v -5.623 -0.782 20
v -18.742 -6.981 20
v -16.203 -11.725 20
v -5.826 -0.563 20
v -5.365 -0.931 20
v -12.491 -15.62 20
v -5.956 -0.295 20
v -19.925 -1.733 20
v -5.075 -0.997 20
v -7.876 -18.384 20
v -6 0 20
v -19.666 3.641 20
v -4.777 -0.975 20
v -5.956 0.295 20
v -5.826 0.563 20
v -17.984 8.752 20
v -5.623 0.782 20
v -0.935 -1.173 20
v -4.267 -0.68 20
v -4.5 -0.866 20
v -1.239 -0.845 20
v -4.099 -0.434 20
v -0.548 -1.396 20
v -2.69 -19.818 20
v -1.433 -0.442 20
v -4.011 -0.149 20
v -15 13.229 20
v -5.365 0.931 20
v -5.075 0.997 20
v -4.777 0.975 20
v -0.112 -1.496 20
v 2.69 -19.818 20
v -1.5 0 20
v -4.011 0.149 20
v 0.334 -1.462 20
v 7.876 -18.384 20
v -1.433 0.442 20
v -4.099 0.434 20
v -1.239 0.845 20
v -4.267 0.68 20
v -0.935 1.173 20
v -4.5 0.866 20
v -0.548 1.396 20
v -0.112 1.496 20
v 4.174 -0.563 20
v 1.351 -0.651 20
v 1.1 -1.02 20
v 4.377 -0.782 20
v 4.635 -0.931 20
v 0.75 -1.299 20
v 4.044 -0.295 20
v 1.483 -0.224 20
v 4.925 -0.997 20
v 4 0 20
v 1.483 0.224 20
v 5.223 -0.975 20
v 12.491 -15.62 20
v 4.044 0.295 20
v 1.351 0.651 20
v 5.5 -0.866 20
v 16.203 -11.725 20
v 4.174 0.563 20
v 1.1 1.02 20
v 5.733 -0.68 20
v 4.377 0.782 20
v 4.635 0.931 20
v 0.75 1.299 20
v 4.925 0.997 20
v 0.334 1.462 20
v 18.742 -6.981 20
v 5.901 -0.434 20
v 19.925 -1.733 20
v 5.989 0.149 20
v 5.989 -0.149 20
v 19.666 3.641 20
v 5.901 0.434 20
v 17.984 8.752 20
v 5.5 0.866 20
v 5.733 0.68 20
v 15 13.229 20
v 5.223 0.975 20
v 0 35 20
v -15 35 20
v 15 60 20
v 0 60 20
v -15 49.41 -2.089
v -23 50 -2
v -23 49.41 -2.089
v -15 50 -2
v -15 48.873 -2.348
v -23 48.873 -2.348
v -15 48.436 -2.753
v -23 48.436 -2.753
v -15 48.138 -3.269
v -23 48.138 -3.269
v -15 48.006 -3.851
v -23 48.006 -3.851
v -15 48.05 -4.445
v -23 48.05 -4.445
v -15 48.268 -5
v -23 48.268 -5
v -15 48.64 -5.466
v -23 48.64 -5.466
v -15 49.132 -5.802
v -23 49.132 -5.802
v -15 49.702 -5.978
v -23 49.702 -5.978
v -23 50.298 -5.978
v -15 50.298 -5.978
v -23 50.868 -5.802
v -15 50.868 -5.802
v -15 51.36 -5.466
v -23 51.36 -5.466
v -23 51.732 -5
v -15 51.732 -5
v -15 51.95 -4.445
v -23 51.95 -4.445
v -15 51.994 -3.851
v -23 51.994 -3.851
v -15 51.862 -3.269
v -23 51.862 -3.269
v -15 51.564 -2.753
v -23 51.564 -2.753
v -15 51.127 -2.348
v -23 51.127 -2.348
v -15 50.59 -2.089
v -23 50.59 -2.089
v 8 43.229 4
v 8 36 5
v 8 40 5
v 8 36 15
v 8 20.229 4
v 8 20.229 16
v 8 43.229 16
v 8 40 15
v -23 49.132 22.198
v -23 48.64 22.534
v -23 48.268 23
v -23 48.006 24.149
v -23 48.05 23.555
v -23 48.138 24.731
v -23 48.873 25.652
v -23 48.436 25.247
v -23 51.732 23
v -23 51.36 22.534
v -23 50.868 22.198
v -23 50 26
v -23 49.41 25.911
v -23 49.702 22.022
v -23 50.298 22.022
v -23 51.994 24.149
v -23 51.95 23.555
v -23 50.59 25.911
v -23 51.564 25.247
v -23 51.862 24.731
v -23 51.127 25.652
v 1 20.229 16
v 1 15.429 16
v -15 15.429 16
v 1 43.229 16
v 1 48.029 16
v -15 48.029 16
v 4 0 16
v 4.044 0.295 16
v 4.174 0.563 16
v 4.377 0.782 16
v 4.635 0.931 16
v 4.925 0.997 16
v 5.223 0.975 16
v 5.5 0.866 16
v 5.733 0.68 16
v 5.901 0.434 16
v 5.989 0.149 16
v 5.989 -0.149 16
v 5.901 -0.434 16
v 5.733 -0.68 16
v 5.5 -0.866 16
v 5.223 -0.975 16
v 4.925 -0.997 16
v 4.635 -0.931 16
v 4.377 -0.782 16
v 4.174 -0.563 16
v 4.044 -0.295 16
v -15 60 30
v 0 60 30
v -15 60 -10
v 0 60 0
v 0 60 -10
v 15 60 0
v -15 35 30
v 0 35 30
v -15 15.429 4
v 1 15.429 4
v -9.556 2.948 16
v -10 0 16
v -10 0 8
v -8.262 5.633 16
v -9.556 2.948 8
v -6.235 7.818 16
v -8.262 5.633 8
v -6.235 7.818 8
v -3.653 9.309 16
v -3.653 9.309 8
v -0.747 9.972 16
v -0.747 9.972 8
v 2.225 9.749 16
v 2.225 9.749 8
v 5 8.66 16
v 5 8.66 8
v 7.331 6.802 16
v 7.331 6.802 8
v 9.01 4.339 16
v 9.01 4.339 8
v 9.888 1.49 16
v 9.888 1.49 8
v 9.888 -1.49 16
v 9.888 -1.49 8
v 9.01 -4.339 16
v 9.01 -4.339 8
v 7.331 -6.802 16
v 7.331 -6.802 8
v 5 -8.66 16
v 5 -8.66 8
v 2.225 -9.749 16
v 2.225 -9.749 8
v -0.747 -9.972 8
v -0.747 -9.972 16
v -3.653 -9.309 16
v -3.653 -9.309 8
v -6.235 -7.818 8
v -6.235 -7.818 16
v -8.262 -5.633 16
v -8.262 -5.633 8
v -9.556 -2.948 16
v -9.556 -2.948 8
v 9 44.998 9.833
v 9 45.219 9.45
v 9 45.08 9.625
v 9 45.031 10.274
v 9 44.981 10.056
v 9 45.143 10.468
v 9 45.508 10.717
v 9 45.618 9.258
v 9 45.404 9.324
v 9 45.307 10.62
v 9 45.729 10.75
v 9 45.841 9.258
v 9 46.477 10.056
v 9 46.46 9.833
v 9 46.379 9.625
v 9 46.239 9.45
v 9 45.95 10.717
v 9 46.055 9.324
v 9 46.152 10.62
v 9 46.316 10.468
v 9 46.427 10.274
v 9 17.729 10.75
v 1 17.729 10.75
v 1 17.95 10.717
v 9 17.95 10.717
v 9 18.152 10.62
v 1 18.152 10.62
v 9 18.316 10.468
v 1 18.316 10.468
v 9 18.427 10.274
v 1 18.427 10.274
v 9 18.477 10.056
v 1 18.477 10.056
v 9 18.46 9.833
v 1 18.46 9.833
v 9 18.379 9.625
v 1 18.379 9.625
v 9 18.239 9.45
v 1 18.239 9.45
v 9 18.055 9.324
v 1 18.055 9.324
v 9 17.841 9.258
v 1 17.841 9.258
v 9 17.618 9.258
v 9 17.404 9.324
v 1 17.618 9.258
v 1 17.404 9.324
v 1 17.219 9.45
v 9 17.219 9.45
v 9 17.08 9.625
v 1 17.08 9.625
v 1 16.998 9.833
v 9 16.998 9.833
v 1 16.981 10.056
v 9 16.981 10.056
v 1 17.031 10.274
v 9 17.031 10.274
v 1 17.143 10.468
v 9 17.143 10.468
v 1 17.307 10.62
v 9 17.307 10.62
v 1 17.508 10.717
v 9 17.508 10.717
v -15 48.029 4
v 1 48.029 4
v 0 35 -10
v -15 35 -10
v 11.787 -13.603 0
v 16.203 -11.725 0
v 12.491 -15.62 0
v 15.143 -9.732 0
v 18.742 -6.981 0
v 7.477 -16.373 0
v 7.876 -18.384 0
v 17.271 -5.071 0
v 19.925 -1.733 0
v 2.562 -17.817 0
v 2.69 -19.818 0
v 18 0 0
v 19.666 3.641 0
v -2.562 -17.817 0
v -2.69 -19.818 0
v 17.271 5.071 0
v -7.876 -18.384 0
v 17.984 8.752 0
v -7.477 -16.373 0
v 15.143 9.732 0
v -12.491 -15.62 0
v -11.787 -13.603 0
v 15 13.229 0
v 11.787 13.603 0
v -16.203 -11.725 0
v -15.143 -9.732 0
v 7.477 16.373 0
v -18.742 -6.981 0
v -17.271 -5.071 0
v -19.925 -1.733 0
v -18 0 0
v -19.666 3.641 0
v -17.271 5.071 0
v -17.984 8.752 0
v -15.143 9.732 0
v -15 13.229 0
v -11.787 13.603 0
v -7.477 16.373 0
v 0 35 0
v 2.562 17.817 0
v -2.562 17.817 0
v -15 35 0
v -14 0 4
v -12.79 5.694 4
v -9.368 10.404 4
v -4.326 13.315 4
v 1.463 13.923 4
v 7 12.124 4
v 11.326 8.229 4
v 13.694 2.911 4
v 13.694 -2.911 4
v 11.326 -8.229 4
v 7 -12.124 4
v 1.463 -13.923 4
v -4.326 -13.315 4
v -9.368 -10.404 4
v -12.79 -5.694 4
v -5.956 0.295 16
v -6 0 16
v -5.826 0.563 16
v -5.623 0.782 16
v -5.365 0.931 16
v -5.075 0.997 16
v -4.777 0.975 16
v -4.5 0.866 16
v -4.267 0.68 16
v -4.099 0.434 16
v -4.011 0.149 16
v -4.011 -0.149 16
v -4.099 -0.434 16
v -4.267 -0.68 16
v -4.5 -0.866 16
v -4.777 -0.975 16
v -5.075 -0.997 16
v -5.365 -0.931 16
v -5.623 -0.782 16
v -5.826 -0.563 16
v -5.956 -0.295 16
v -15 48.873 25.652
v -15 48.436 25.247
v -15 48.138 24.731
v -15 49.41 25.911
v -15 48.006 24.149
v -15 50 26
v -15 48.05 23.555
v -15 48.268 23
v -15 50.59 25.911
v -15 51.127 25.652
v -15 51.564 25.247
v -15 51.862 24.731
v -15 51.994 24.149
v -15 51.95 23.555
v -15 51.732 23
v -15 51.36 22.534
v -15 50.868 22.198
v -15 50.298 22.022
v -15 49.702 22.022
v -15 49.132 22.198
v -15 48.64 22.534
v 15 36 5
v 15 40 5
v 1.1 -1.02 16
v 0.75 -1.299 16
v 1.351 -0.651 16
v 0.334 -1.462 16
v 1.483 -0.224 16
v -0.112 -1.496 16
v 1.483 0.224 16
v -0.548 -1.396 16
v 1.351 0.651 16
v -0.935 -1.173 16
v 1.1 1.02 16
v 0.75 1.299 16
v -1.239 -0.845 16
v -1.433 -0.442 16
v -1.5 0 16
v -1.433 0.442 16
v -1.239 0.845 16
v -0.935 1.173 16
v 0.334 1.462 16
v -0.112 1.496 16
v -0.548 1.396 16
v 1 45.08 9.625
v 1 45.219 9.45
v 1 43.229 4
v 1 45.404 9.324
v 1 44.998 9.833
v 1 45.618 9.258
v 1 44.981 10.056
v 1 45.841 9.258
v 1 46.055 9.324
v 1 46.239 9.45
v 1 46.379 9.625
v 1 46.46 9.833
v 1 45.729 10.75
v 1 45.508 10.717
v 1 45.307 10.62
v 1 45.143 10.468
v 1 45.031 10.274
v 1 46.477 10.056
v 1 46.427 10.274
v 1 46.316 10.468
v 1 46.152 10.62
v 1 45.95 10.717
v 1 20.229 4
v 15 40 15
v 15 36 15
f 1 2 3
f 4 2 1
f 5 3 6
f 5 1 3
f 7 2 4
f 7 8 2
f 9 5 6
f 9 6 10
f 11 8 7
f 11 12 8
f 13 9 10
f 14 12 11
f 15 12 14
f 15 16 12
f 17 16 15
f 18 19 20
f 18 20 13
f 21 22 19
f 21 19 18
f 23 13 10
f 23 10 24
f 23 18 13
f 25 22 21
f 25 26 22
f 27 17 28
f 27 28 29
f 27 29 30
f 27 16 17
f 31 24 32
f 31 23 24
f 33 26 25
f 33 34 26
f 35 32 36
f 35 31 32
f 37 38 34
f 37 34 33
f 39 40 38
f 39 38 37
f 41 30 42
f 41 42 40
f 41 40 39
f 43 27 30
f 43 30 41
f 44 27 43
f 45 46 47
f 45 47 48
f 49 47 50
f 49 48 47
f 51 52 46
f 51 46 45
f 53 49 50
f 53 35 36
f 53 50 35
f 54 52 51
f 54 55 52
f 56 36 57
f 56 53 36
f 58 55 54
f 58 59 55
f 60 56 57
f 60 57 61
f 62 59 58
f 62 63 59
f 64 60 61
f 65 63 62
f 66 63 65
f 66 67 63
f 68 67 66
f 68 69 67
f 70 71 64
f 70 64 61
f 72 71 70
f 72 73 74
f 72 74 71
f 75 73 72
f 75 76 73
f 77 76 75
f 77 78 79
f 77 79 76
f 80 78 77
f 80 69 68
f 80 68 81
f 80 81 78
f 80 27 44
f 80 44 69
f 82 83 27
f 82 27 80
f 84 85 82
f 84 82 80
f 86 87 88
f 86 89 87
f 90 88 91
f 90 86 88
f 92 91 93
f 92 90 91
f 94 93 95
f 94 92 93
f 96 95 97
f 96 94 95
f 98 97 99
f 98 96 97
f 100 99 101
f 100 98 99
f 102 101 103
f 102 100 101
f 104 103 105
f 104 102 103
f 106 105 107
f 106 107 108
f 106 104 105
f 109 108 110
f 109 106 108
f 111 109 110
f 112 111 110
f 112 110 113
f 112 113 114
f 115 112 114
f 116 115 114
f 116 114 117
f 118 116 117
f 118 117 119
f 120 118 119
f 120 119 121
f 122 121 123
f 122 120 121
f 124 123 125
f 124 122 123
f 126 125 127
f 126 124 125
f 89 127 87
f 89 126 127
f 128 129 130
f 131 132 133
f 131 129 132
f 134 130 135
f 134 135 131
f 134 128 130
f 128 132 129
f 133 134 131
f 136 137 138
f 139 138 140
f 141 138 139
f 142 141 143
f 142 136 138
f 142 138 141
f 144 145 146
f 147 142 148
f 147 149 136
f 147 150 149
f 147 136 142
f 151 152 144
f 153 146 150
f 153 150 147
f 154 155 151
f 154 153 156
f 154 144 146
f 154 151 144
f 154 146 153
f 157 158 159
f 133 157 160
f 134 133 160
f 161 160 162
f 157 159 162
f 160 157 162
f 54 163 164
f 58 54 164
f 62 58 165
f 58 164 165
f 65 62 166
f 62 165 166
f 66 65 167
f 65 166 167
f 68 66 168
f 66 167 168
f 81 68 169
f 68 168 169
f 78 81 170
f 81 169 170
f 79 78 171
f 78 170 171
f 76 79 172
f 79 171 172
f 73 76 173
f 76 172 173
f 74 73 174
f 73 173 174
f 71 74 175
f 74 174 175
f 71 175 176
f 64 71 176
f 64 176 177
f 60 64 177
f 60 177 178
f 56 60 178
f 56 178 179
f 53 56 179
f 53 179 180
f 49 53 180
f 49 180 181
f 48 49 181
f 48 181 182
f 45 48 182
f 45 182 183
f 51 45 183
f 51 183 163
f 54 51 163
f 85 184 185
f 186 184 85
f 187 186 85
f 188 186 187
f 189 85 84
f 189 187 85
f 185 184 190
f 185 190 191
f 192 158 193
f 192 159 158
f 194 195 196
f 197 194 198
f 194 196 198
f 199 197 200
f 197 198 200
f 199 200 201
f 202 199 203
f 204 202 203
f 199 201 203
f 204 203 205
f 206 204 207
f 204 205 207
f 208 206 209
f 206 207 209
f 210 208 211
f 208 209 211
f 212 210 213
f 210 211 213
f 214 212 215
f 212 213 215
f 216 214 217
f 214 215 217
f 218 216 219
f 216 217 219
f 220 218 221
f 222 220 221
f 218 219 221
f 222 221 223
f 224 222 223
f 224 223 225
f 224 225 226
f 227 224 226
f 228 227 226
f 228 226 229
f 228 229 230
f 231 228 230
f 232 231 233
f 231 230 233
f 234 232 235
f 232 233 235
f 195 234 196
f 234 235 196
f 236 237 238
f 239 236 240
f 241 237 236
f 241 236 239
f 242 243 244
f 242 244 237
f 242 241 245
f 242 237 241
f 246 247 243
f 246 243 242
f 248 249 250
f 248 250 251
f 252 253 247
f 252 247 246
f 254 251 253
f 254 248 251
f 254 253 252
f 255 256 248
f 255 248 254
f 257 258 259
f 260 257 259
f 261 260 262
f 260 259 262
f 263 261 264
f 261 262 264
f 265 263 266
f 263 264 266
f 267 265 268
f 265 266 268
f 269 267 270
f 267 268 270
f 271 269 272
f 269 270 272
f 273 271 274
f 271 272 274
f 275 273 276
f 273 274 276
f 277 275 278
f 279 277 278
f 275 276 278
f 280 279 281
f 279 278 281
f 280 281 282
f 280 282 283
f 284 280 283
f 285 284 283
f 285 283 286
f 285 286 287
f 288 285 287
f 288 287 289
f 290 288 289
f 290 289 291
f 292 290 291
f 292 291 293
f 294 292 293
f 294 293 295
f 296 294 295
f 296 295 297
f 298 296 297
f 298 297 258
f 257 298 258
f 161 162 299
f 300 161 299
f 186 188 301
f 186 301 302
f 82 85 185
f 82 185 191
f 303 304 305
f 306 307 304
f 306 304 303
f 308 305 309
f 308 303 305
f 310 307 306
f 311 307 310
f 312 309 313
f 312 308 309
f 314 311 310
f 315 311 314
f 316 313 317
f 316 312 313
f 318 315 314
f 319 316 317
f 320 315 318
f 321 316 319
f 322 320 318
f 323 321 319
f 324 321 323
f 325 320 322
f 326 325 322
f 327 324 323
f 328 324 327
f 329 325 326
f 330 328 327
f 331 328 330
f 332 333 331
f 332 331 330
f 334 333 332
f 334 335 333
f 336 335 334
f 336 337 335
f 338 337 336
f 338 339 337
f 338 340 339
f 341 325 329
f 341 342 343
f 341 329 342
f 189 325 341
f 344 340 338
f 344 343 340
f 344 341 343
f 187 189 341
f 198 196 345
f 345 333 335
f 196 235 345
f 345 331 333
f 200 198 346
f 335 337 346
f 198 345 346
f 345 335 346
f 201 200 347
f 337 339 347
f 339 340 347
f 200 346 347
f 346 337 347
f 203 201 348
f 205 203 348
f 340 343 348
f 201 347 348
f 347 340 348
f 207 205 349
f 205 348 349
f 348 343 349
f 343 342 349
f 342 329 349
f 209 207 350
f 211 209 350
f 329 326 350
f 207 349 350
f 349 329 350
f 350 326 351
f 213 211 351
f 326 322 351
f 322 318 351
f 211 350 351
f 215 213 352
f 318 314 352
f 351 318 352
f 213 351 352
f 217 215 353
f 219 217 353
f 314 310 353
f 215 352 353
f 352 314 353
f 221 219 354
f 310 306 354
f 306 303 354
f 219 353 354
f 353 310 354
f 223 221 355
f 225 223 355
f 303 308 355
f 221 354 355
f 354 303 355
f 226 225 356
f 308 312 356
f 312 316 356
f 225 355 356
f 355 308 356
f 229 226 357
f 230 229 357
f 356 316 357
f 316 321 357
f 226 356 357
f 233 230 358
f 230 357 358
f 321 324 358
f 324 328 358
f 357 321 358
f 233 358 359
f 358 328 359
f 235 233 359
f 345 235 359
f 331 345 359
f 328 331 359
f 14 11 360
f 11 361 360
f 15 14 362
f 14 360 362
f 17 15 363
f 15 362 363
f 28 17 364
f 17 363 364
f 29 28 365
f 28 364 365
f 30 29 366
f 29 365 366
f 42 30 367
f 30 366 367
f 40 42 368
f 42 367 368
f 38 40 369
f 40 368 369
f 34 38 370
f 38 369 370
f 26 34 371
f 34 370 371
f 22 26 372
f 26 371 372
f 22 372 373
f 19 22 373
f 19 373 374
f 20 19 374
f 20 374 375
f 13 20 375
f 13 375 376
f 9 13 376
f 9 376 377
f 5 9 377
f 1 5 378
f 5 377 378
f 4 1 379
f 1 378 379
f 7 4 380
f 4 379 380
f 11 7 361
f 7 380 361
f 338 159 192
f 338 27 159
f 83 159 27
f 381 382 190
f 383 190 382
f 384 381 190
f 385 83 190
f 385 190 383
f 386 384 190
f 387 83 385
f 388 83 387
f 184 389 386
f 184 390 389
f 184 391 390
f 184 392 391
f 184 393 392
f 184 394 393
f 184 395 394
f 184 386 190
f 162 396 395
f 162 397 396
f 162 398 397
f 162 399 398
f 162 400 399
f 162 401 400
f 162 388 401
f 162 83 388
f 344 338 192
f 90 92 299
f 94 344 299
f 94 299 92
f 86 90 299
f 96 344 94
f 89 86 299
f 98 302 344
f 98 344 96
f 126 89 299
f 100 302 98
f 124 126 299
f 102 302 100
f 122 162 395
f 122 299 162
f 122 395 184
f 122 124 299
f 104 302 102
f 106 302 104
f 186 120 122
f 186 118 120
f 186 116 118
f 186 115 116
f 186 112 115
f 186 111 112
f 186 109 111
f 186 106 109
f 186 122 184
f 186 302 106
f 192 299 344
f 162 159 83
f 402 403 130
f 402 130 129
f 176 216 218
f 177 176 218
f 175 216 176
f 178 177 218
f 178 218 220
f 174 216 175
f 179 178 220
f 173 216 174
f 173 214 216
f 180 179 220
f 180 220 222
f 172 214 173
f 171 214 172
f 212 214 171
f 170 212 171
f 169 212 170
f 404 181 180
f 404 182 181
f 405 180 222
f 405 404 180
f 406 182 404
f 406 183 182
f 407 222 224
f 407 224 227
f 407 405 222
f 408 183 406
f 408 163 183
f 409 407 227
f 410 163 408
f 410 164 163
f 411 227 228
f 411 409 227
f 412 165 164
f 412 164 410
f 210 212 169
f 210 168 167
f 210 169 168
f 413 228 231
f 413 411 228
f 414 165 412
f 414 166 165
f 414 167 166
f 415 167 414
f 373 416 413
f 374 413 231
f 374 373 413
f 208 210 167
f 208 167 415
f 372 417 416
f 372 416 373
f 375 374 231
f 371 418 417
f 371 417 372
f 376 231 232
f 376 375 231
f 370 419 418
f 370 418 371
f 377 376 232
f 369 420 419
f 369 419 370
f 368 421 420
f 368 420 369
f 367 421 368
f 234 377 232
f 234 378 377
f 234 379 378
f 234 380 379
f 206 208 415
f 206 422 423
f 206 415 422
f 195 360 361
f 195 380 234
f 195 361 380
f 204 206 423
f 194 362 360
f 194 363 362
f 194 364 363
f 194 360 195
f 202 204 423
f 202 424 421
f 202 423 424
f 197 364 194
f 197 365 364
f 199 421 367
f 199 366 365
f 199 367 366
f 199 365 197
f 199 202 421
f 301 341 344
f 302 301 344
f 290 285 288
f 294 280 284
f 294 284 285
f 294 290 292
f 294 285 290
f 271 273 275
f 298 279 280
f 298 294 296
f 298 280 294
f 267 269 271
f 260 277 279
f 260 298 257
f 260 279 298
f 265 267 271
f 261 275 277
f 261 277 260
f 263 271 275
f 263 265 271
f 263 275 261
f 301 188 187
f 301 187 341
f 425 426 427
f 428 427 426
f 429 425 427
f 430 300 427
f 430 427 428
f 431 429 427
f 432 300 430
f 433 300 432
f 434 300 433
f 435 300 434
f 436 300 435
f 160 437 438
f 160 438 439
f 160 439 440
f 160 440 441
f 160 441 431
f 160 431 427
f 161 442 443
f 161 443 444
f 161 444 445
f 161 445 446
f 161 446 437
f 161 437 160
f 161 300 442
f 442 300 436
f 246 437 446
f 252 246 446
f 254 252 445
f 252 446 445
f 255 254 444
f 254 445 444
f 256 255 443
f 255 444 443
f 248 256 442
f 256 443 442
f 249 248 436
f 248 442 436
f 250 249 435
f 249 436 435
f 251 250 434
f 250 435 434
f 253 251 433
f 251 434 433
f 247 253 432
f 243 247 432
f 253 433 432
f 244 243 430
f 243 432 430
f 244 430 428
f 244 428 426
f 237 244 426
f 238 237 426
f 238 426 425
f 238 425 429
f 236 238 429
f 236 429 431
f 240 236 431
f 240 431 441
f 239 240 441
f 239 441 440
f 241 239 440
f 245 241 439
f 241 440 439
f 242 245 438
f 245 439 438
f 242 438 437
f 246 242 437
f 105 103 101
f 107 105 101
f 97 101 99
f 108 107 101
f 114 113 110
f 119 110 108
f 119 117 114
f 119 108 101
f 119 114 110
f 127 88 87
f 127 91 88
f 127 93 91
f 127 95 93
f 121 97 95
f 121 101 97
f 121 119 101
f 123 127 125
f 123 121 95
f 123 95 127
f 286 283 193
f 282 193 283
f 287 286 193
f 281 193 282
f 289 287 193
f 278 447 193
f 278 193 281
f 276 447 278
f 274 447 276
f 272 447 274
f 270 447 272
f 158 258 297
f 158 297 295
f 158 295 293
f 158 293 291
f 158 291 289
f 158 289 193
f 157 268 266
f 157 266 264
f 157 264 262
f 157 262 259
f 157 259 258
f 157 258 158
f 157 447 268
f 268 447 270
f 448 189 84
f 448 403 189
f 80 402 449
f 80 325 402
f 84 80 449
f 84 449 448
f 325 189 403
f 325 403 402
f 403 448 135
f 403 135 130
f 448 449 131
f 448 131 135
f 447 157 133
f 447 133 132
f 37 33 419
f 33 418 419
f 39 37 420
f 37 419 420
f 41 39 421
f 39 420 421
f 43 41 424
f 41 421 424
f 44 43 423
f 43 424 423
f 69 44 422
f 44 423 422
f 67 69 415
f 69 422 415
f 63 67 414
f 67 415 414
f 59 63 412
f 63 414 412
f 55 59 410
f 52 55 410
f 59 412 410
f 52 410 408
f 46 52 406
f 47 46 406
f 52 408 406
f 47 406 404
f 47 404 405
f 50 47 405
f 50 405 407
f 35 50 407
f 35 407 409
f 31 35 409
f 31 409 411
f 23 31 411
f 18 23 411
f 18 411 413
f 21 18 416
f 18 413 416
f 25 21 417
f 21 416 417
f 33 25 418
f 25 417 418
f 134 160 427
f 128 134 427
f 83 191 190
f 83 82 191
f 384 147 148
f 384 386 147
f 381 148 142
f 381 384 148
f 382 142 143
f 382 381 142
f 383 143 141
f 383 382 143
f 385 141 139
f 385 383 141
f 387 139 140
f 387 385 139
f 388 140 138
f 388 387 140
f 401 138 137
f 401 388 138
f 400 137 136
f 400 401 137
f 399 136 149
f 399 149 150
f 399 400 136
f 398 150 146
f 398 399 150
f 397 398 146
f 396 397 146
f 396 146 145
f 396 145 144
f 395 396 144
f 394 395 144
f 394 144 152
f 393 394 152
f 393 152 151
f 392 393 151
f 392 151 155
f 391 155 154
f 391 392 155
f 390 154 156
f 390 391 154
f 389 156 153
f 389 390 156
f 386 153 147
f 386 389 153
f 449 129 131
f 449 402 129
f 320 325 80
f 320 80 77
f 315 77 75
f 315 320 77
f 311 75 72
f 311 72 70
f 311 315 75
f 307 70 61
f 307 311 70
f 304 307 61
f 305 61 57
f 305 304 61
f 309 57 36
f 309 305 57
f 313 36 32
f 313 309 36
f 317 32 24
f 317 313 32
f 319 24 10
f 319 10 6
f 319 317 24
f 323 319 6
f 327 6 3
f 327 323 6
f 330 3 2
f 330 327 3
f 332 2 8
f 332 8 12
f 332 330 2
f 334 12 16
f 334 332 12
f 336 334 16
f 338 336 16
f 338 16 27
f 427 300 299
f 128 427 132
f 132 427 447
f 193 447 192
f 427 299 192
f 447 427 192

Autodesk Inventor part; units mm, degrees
ref_plane "YZ Plane" through (0, 0, 0) normal (1, 0, 0) x (0, 1, 0)
ref_plane "XZ Plane" through (0, 0, 0) normal (0, 1, 0) x (-1, 0, 0)
ref_plane "XY Plane" through (0, 0, 0) normal (0, 0, 1) x (1, 0, 0)
sketch "Sketch1" plane through (0, 0, 0) normal (0, 0, 1) x (1, 0, 0)
  circle A0 centre (0, 0) radius 10
  circle A1 centre (0, 0) radius 20
  line L0 (-15, 0) -> (15, 0)
  line L1 (15, 0) -> (15, 50)
  line L2 (15, 50) -> (-15, 50)
  line L3 (-15, 50) -> (-15, 0)
  point P0 (-15, 13.2288)
  point P1 (15, 13.2288)
  dimension "d0" = 20
  dimension "d1" = 40
  dimension "d2" = 30
  dimension "d3" = 50
extrude "Extrusion1" add sketch "Sketch1" along normal blind 20
sketch "Sketch2" plane through (0, 0, 20) normal (0, 0, 1) x (1, 0, 0)
  circle A0 centre (0, 0) radius 10
  dimension "d6" = 20
extrude "Extrusion2" cut sketch "Sketch2" against normal blind 15
sketch "Sketch4" plane through (-15, 13.2288, 0) normal (-1, 0, 0) x (0, 0, 1)
  line L0 (0, 36.7712) -> (20, 36.7712) projected
  line L1 (0, 0) -> (0, 36.7712) projected
  line L2 (20, 36.7712) -> (0, 36.7712)
  line L3 (0, 36.7712) -> (0, 0)
  line L4 (0, 0) -> (20, 0)
  line L5 (20, 0) -> (20, 36.7712)
  line L6 (0, 0) -> (20, 0) projected
  line L7 (20, 36.7712) -> (10, 36.7712)
  line L8 (10, 36.7712) -> (10, 0)
  line L9 (10, 0) -> (20, 0)
  line L10 (20, 0) -> (20, 36.7712)
  line L11 (10, 0) -> (16, 0)
  line L12 (16, 0) -> (16, 25)
  line L13 (16, 25) -> (10, 25)
  line L14 (10, 25) -> (10, 0)
  line L15 (10, 25) -> (4, 25)
  line L16 (4, 25) -> (4, 0)
  line L17 (4, 0) -> (10, 0)
  line L18 (10, 0) -> (10, 25)
  line L19 (4, 25) -> (16, 25)
  line L20 (16, 25) -> (16, 30.0005)
  line L21 (16, 30.0005) -> (4, 30.0005)
  line L22 (4, 30.0005) -> (4, 25)
  line L23 (4, 30.0005) -> (16, 30.0005)
  line L24 (16, 30.0005) -> (16, 7.0005)
  line L25 (16, 7.0005) -> (4, 7.0005)
  line L26 (4, 7.0005) -> (4, 30.0005)
  line L27 (10, 7.0005) -> (16, 7.0005)
  line L28 (16, 7.0005) -> (16, 0)
  line L29 (16, 0) -> (10, 0)
  line L30 (10, 0) -> (10, 7.0005)
  point P0 (0, -13.2288)
  dimension "d13" = 6
  dimension "d14" = 25
  dimension "d15" = 6
  dimension "d16" = 23
extrude "Extrusion3" cut sketch "Sketch4" against normal blind 23 contours L21 L20 L13 L8 | L8 L15 L22 L21 | L13 L12 L25 L8 | L8 L25 L16 L15
sketch "Sketch6" plane through (-15, 13.2288, 0) normal (-1, 0, 0) x (0, 0, 1)
  line L0 (4, 7.0005) -> (4, 30.0005) projected
  line L1 (4, 7.0005) -> (16, 7.0005)
  line L2 (16, 7.0005) -> (16, 2.2005)
  line L3 (16, 2.2005) -> (4, 2.2005)
  line L4 (4, 2.2005) -> (4, 7.0005)
  line L5 (4, 30.0005) -> (16, 30.0005)
  line L6 (16, 30.0005) -> (16, 34.8005)
  line L7 (16, 34.8005) -> (4, 34.8005)
  line L8 (4, 34.8005) -> (4, 30.0005)
  point P0 (0, -13.2288)
  dimension "d19" = 12
  dimension "d20" = 4.8
  dimension "d21" = 4.8
extrude "Extrusion4" cut sketch "Sketch6" against normal blind 16
sketch "Sketch7" plane through (1, 13.2288, 0) normal (-1, 0, 0) x (0, 0, 1)
  line L0 (4, 30.0005) -> (16, 30.0005) projected
  line L1 (4, 30.0005) -> (10, 30.0005)
  line L2 (10, 30.0005) -> (10, 32.5005)
  line L3 (10, 32.5005) -> (4, 32.5005)
  line L4 (4, 32.5005) -> (4, 30.0005)
  circle A0 centre (10, 32.5005) radius 0.75
  line L5 (16, 7.0005) -> (4, 7.0005) projected
  line L6 (16, 7.0005) -> (16, 2.2005) projected
  line L7 (4, 7.0005) -> (16, 7.0005)
  line L8 (16, 7.0005) -> (16, 4.5005)
  line L9 (16, 4.5005) -> (4, 4.5005)
  line L10 (4, 4.5005) -> (4, 7.0005)
  line L11 (10, 4.5005) -> (4, 4.5005)
  line L12 (4, 4.5005) -> (4, 7.0005)
  line L13 (4, 7.0005) -> (10, 7.0005)
  line L14 (10, 7.0005) -> (10, 4.5005)
  circle A1 centre (10, 4.5005) radius 0.75
  point P0 (0, -13.2288)
  dimension "d24" = 2.5
  dimension "d25" = 1.5
  dimension "d26" = 2.5
  dimension "d27" = 1.5
extrude "Extrusion5" cut sketch "Sketch7" against normal blind 8 contours A0 L3 L2 | L2 L3 A0 | A1 L9 L14 | L14 L9 A1 | A1 L9
sketch "Sketch8" plane through (15, 13.2288, 0) normal (1, 0, 0) x (0, 0, -1)
  line L0 (0, 36.7712) -> (0, 0) projected
  line L1 (-20, 36.7712) -> (-20, 0) projected
  line L2 (0, 36.7712) -> (-20, 36.7712)
  line L3 (-20, 36.7712) -> (-20, 26.7712)
  line L4 (-20, 26.7712) -> (0, 26.7712)
  line L5 (0, 26.7712) -> (0, 36.7712)
  line L6 (0, 26.7712) -> (-20, 26.7712)
  line L7 (-20, 26.7712) -> (-20, 18.7712)
  line L8 (-20, 18.7712) -> (0, 18.7712)
  line L9 (0, 18.7712) -> (0, 26.7712)
  line L10 (0, 26.7712) -> (-10, 26.7712)
  line L11 (-10, 26.7712) -> (-10, 18.7712)
  line L12 (-10, 18.7712) -> (0, 18.7712)
  line L13 (0, 18.7712) -> (0, 26.7712)
  line L14 (-10, 26.7712) -> (-5, 26.7712)
  line L15 (-5, 26.7712) -> (-5, 22.7712)
  line L16 (-5, 22.7712) -> (-10, 22.7712)
  line L17 (-10, 22.7712) -> (-10, 26.7712)
  line L18 (-10, 22.7712) -> (-15, 22.7712)
  line L19 (-15, 22.7712) -> (-15, 26.7712)
  line L20 (-15, 26.7712) -> (-10, 26.7712)
  line L21 (-10, 26.7712) -> (-10, 22.7712)
  point P0 (0, -13.2288)
  dimension "d30" = 10
  dimension "d31" = 8
  dimension "d32" = 5
  dimension "d33" = 5
extrude "Extrusion6" cut sketch "Sketch8" against normal blind 15.8125 contours L15 L16 L11 L4 | L11 L18 L19 L4
sketch "Sketch9" plane through (0, 0, 5) normal (0, 0, 1) x (1, 0, 0)
  circle A0 centre (0, 0) radius 1
  circle A1 centre (7, 0) radius 1.5
  circle A2 centre (0, 0) radius 1.5
  circle A3 centre (-7, 0) radius 1.5
  dimension "d36" = 2
  dimension "d37" = 3
  dimension "d38" = 3
  dimension "d39" = 3
extrude "Extrusion7" cut sketch "Sketch9" against normal blind 8 contours A0 | A1 | A2 | A3
sketch "Sketch10" plane through (-15, 50, 0) normal (0, 1, 0) x (1, 0, 0)
  line L0 (0, 0) -> (0, -20) projected
  line L1 (0, 0) -> (29.4792, 0)
  line L2 (29.4792, 0) -> (29.4792, -20)
  line L3 (29.4792, -20) -> (0, -20)
  line L4 (0, -20) -> (0, 0)
  point P0 (15, 0)
extrude "Extrusion8" add sketch "Sketch10" along normal blind 10
sketch "Sketch11" plane through (0, 0, 0) normal (0, 0, -1) x (-1, 0, 0)
  line L0 (15, 13.2288) -> (15, 60) projected
  line L1 (-15, 13.2288) -> (-15, 50) projected
  line L2 (15, 60) -> (-15, 60)
  line L3 (-15, 60) -> (-15, 45)
  line L4 (-15, 45) -> (15, 45)
  line L5 (15, 45) -> (15, 60)
  line L6 (15, 45) -> (-15, 45)
  line L7 (-15, 45) -> (-15, 35)
  line L8 (-15, 35) -> (15, 35)
  line L9 (15, 35) -> (15, 45)
  point P0 (0, 0)
  dimension "d47" = 15
  dimension "d48" = 10
sketch "Sketch12" plane through (14.4792, 50, 20) normal (1, 0, 0) x (0, 0, -1)
  line L0 (20, 0) -> (20, 10) projected
  line L1 (0, 0) -> (20, 0)
  line L2 (20, 0) -> (20, 10)
  line L3 (20, 10) -> (0, 10)
  line L4 (0, 10) -> (0, 0)
  point P0 (20, -50)
extrude "Extrusion9" cut sketch "Sketch12" against normal blind 59.6125
sketch "Sketch13" plane through (-15, 50, 0) normal (0, 1, 0) x (1, 0, 0)
  line L0 (30, 0) -> (30, -20) projected
  line L1 (0, 0) -> (30, 0)
  line L2 (30, 0) -> (30, -20)
  line L3 (30, -20) -> (0, -20)
  line L4 (0, -20) -> (0, 0)
  point P0 (15, 0)
extrude "Extrusion10" add sketch "Sketch13" along normal blind 10
extrude "Extrusion11" add sketch "Sketch11" along normal blind 10
sketch "Sketch15" plane through (0, 0, 20) normal (0, 0, 1) x (1, 0, 0)
  line L0 (-15, 60) -> (15, 60) projected
  line L1 (-15, 60) -> (0, 60)
  line L2 (0, 60) -> (0, 35)
  line L3 (0, 35) -> (-15, 35)
  line L4 (-15, 35) -> (-15, 60)
  point P0 (0, 0)
  dimension "d56" = 25
extrude "Extrusion12" add sketch "Sketch15" along normal blind 10
sketch "Sketch16" plane through (0, 0, -10) normal (0, 0, -1) x (-1, 0, 0)
  line L0 (-15, 13.2288) -> (-15, 60) projected
  line L1 (0, 35) -> (15, 35) projected
  line L2 (-15, 60) -> (0, 60)
  line L3 (0, 60) -> (0, 35)
  line L4 (0, 35) -> (-15, 35)
  line L5 (-15, 35) -> (-15, 60)
  point P0 (0, 0)
extrude "Extrusion13" cut sketch "Sketch16" against normal blind 10
sketch "Sketch17" plane through (-15, 13.2288, 0) normal (-1, 0, 0) x (0, 0, 1)
  line L0 (0, 0) -> (0, 46.7712) projected
  line L1 (0, 46.7712) -> (10, 46.7712)
  line L2 (10, 46.7712) -> (10, 23.4712)
  line L3 (10, 23.4712) -> (0, 23.4712)
  line L4 (0, 23.4712) -> (0, 46.7712)
  circle A0 centre (10, 23.4712) radius 10
  line L5 (20, 46.7712) -> (30, 46.7712) projected
  line L6 (20, 0) -> (20, 46.7712) projected
  line L7 (30, 46.7712) -> (20, 46.7712)
  line L8 (20, 46.7712) -> (20, 36.7712)
  line L9 (20, 36.7712) -> (30, 36.7712)
  line L10 (30, 36.7712) -> (30, 46.7712)
  line L11 (30, 46.7712) -> (24, 46.7712)
  line L12 (24, 46.7712) -> (24, 36.7712)
  line L13 (24, 36.7712) -> (30, 36.7712)
  line L14 (30, 36.7712) -> (30, 46.7712)
  circle A1 centre (24, 36.7712) radius 2
  line L15 (30, 46.7712) -> (-10, 46.7712) projected
  line L16 (-10, 46.7712) -> (-4, 46.7712)
  line L17 (-4, 46.7712) -> (-4, 36.7712)
  line L18 (-4, 36.7712) -> (-10, 36.7712)
  line L19 (-10, 36.7712) -> (-10, 46.7712)
  circle A2 centre (-4, 36.7712) radius 2
  point P0 (0, -13.2288)
  dimension "d61" = 23.3
  dimension "d62" = 20
  dimension "d63" = 10
  dimension "d64" = 6
  dimension "d65" = 4
  dimension "d66" = 6
  dimension "d67" = 4
extrude "Extrusion14" add sketch "Sketch17" along normal blind 8 contours A2 L18 L17 | L17 L18 A2 | A1 L12 L9 | L9 A1 | L12 A1 L9
sketch "Sketch18" plane through (0, 0, 20) normal (0, 0, 1) x (1, 0, 0)
  circle A0 centre (0, 0) radius 10
extrude "Extrusion15" add sketch "Sketch18" against normal blind 16
sketch "Sketch19" plane through (0, 0, 0) normal (0, 0, -1) x (-1, 0, 0)
  circle A0 centre (0, 0) radius 1.5 projected
  circle A1 centre (0, 0) radius 10
  dimension "d72" = 20
extrude "Extrusion16" cut sketch "Sketch19" against normal blind 16
sketch "Sketch20" plane through (0, 0, 4) normal (0, 0, -1) x (-1, 0, 0)
  circle A0 centre (0, 0) radius 1.5 projected
  circle A1 centre (0, 0) radius 1.5
extrude "Extrusion17" cut sketch "Sketch20" against normal blind 30.0375
sketch "Sketch21" plane through (0, 0, 16) normal (0, 0, -1) x (-1, 0, 0)
  circle A0 centre (5, 0) radius 1
  circle A1 centre (-5, 0) radius 1
  point P0 (0, 0)
  dimension "d77" = 2
  dimension "d78" = 2
extrude "Extrusion18" cut sketch "Sketch21" against normal blind 138.2375
chamfer "Chamfer2" distance 8 angle 45 1 edges at (10, 0, 0)
properties part number "EndConnector"
